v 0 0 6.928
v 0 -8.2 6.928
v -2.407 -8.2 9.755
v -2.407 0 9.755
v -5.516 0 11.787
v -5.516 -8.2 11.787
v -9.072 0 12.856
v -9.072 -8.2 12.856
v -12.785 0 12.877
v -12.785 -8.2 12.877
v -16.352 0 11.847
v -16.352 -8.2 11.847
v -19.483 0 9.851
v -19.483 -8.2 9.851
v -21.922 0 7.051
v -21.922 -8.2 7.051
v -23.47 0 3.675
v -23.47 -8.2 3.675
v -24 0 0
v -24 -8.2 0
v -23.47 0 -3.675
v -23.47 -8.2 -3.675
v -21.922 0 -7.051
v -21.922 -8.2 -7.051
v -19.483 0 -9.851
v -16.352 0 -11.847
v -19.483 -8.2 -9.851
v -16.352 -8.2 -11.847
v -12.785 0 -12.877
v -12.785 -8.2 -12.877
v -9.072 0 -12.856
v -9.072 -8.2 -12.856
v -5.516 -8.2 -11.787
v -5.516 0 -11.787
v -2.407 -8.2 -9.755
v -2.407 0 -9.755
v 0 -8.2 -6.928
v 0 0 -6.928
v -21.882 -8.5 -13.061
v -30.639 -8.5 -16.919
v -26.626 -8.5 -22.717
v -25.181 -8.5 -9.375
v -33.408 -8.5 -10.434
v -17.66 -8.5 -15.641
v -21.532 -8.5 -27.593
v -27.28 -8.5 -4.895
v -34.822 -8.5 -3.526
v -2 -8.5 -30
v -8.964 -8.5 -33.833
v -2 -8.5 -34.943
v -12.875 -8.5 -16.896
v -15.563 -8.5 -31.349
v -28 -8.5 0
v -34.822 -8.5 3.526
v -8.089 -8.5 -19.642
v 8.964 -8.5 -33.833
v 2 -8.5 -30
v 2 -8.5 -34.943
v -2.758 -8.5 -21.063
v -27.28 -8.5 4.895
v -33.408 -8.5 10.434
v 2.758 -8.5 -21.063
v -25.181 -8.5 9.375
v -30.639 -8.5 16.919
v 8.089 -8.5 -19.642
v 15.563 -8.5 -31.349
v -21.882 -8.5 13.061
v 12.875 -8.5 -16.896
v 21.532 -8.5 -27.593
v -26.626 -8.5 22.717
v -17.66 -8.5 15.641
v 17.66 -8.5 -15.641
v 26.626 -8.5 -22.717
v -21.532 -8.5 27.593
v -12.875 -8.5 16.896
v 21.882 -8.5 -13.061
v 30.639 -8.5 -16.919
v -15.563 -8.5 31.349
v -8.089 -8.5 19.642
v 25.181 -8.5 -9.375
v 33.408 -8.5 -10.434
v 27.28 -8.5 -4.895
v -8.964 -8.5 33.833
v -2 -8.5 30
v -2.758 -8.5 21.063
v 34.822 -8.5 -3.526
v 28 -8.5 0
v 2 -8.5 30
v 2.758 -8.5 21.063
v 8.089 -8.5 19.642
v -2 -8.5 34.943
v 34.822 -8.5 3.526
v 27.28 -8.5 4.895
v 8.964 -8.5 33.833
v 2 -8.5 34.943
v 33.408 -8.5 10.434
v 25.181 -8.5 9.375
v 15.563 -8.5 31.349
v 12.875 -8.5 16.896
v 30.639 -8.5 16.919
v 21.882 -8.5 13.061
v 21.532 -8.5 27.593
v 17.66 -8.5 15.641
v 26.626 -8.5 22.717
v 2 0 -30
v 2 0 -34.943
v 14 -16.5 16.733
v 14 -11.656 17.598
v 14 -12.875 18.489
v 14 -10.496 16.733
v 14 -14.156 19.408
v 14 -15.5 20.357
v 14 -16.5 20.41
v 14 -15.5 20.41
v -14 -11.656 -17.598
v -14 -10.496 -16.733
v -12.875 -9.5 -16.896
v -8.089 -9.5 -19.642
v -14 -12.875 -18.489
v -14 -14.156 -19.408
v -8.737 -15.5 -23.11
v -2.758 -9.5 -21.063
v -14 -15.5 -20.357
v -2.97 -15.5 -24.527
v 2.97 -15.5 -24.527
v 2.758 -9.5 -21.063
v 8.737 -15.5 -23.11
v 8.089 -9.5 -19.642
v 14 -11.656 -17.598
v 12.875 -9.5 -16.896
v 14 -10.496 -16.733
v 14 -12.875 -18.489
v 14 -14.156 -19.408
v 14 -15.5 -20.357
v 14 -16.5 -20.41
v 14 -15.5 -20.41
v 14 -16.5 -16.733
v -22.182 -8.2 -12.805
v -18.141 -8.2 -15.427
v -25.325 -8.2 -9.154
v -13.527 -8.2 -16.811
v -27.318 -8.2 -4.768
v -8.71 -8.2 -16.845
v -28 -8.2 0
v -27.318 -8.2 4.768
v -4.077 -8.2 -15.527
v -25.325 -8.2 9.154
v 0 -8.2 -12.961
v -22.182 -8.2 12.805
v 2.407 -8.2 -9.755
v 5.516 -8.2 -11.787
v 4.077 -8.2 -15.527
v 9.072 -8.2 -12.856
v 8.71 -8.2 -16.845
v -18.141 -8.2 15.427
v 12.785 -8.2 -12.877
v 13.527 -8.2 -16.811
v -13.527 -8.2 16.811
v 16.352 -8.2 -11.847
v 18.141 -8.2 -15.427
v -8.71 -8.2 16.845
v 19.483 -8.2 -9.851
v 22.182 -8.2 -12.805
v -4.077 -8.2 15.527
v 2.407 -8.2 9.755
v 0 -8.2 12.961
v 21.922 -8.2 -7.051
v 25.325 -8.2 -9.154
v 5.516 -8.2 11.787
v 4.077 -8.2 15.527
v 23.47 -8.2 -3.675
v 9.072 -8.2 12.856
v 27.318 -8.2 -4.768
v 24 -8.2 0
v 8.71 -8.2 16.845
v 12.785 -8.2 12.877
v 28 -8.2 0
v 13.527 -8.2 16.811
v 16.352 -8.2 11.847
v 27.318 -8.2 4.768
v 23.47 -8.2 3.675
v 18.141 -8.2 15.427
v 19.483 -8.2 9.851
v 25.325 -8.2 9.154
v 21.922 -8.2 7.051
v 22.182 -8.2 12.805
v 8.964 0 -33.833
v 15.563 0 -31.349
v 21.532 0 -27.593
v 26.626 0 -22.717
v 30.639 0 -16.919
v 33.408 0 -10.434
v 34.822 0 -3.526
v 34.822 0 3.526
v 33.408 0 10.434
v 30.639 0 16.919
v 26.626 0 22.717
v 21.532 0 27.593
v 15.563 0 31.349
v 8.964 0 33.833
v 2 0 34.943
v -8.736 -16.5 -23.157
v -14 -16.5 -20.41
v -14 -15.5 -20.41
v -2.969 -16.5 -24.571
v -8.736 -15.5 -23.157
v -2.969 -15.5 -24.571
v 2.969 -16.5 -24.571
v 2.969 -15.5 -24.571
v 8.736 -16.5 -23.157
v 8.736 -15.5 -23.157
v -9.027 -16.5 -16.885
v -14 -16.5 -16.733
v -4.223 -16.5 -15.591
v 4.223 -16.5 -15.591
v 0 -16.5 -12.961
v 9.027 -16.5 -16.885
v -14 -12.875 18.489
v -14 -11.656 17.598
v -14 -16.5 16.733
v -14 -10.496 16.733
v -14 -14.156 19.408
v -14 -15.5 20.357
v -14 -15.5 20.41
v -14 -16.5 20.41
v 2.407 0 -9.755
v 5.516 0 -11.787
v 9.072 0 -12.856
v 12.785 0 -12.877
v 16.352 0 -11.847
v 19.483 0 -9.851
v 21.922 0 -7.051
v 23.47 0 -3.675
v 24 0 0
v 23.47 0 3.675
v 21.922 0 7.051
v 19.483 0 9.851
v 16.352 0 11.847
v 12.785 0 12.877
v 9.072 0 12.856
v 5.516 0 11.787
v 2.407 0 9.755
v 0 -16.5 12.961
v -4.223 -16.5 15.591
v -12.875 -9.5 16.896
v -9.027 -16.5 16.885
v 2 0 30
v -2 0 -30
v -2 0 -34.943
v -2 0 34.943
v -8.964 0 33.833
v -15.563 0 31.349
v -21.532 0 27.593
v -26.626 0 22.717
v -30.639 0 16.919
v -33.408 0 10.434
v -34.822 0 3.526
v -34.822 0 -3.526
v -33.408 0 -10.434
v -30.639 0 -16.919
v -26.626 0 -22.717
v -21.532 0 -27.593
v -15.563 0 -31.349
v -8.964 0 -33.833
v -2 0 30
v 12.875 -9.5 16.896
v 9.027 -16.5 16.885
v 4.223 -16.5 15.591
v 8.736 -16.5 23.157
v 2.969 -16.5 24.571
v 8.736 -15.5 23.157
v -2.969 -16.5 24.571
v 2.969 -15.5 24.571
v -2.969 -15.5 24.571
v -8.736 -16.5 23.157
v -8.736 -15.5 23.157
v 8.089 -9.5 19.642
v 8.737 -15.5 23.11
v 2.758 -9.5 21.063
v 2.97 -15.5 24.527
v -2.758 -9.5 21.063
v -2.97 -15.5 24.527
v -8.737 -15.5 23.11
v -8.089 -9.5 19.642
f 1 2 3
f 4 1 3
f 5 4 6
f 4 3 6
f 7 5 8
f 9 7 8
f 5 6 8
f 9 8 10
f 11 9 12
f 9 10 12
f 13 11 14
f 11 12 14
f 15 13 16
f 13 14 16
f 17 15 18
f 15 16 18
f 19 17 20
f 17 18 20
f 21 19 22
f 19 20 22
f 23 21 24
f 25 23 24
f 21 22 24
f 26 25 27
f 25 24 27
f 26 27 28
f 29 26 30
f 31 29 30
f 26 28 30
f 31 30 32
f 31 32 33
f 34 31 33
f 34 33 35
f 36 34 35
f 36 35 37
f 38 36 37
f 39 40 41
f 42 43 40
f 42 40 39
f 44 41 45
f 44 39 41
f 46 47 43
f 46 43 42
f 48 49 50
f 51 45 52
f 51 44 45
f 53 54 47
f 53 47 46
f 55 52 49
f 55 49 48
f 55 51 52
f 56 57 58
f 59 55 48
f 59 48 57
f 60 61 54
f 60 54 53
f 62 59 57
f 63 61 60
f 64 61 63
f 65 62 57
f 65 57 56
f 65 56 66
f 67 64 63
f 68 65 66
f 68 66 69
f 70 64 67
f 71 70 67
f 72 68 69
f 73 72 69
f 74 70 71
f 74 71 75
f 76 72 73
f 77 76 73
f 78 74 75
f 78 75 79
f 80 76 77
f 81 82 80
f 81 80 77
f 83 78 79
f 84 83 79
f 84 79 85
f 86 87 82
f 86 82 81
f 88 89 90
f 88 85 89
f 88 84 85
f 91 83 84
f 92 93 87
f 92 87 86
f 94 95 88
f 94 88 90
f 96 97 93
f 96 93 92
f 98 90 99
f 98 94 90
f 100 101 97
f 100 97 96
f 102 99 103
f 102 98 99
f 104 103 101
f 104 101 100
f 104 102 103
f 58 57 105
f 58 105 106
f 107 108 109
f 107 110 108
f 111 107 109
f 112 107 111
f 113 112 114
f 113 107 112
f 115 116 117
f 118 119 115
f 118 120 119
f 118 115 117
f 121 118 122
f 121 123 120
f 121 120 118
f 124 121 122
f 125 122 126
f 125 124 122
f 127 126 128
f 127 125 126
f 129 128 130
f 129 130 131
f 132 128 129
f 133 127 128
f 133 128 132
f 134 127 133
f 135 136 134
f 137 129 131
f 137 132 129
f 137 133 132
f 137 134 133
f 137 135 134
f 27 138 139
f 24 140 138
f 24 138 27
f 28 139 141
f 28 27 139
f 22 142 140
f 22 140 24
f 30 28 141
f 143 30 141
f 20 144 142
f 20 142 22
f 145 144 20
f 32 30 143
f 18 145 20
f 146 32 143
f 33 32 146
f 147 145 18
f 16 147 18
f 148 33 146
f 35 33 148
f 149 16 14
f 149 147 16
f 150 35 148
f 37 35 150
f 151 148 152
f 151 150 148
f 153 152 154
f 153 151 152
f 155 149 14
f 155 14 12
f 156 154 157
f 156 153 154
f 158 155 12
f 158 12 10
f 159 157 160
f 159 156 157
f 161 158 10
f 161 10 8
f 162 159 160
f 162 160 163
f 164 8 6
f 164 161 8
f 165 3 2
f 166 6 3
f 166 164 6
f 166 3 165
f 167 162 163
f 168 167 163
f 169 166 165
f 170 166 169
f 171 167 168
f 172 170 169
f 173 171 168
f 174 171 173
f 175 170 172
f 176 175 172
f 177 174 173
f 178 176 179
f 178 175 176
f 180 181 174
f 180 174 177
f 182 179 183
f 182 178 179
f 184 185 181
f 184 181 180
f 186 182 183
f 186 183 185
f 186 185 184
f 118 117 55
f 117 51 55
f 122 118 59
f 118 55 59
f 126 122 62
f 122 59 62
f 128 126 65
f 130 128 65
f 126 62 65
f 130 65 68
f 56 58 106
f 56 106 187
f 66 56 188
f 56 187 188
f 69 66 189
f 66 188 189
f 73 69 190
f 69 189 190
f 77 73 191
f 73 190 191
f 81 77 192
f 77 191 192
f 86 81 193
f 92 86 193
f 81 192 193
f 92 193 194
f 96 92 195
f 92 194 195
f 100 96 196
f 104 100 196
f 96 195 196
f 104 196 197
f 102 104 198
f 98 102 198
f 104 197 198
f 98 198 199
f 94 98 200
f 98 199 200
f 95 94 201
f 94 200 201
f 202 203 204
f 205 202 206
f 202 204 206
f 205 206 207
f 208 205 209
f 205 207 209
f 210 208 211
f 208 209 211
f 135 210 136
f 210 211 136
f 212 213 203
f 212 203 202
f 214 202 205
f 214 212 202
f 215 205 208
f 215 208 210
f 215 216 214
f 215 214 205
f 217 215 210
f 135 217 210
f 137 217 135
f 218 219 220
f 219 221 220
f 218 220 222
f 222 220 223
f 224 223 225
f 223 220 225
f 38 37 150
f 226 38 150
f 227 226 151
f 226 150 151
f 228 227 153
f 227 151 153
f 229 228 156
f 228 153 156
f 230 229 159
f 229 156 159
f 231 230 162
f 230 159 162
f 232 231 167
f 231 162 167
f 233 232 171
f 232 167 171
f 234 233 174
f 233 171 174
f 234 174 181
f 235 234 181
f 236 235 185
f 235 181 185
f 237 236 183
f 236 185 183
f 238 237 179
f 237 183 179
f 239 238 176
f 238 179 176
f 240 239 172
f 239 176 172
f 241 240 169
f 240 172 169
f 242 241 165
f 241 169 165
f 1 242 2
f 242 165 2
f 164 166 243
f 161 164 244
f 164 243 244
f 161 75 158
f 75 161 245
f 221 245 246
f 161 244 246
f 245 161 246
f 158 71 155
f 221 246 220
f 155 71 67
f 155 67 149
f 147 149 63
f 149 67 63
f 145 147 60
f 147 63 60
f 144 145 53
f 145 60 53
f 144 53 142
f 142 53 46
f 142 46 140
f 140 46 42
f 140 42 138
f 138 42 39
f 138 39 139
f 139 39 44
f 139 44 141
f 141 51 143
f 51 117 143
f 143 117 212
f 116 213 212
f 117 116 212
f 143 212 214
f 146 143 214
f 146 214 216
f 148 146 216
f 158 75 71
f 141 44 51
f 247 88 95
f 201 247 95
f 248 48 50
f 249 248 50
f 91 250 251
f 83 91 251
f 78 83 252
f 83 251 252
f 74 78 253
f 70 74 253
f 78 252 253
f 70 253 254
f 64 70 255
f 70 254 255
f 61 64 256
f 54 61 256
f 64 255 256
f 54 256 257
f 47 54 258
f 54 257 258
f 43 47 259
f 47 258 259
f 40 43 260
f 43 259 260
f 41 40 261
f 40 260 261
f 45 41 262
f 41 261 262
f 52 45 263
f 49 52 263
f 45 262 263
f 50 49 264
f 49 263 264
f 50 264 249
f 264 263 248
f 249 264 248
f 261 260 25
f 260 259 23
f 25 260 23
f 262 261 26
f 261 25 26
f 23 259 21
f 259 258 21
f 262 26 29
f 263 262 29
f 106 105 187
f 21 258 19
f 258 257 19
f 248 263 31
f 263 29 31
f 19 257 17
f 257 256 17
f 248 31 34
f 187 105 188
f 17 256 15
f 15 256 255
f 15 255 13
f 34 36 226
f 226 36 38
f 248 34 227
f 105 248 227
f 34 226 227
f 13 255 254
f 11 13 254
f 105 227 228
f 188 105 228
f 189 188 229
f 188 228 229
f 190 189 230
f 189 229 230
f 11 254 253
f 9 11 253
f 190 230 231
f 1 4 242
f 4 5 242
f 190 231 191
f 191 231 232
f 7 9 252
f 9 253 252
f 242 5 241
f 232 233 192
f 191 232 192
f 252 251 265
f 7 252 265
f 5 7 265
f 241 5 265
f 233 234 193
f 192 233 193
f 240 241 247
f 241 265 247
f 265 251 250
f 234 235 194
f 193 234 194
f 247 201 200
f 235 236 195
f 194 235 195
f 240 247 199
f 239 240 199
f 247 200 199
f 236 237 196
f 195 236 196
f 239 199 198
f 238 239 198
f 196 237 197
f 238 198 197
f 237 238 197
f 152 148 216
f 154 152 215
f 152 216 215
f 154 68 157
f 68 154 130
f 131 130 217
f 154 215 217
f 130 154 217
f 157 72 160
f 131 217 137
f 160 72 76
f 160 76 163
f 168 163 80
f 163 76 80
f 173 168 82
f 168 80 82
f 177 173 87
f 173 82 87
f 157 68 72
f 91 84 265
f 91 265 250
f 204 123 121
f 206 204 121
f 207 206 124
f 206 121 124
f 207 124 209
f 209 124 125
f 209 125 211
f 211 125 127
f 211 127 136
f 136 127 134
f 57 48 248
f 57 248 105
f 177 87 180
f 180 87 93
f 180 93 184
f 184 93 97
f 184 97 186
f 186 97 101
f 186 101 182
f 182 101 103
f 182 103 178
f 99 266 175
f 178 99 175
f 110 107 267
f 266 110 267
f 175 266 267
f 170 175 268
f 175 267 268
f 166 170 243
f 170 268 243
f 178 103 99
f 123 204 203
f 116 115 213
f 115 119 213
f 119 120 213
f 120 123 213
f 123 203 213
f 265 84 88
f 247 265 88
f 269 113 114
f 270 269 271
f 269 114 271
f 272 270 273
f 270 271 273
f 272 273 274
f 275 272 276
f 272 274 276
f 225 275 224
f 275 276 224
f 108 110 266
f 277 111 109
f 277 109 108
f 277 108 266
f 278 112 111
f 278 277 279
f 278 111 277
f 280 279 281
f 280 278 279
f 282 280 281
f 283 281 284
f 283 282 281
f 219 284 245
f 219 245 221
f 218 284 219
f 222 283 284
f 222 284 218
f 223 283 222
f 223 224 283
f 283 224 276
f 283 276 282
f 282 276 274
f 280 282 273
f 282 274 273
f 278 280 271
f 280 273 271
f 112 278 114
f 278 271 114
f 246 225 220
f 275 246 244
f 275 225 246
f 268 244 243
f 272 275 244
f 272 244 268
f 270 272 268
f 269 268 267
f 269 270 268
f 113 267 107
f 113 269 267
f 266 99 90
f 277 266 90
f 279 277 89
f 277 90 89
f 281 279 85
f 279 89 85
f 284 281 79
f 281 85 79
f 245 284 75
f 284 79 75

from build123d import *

# Parameters (mm, degrees)
F0_R      = 35
F1_DEPTH  = 8.5
F2_R      = 21.2425
F3_DEPTH  = 1
F4_R      = 21.2425
F5_DEPTH  = 6
F5_TAPER  = -30
F6_R      = 24.75
F7_DEPTH  = 1
F9_DEPTH  = 16.5
F11_DEPTH = 8.3
F12_W     = 12.0533492022
F12_H     = 52.1821774244
F12_W_2   = 10.4364354849
F12_H_2   = 52.770149804
F13_DEPTH = 8
F14_W     = 4
F14_H     = 6
F15_DEPTH = 8.5


# Not quite as in the source:
# - a pattern or mirror of a feature is missing from the dataset's text; its kind, count and spacing are read off the source's solid


with BuildPart() as f1:
    # F0 (on Front) → F1 (new body)
    with BuildSketch(Plane.XZ):
        Circle(F0_R)
    extrude(amount=F1_DEPTH)

    # F2 (on face) → F3 (join)
    with BuildSketch(Plane.XZ.offset(8.5)):
        Circle(F2_R)
    extrude(amount=F3_DEPTH)

    # F4 (on face) → F5 (join)
    with BuildSketch(Plane.XZ.offset(9.5)):
        Circle(F4_R)
    extrude(amount=F5_DEPTH, taper=F5_TAPER)

    # F6 (on face) → F7 (join)
    with BuildSketch(Plane.XZ.offset(15.5)):
        Circle(F6_R)
    extrude(amount=F7_DEPTH)

    # F8 (on face) → F9 (cut)
    with BuildSketch(Plane.XZ.offset(16.5)):
        with BuildLine():
            ThreePointArc((0, -6.9282032303), (1.4899959968, -3.6055512755), (2, 0))
            ThreePointArc((2, 0), (1.4899959968, 3.6055512755), (0, 6.9282032303))
            ThreePointArc((0, 6.9282032303), (-2, 0), (0, -6.9282032303))
        make_face()
        with BuildLine():
            ThreePointArc((0, 6.9282032303), (1.4899959968, 3.6055512755), (2, 0))
            ThreePointArc((2, 0), (1.4899959968, -3.6055512755), (0, -6.9282032303))
            ThreePointArc((0, -6.9282032303), (14.6055512755, -12.4899959968), (24, 0))
            ThreePointArc((24, 0), (14.6055512755, 12.4899959968), (0, 6.9282032303))
        make_face()
        with BuildLine():
            ThreePointArc((0, -6.9282032303), (-2, 0), (0, 6.9282032303))
            ThreePointArc((0, 6.9282032303), (-24, 0), (0, -6.9282032303))
        make_face()
    extrude(amount=-F9_DEPTH, mode=Mode.SUBTRACT)

    # F10 (on face) → F11 (cut)
    with BuildSketch(Plane.XZ.offset(16.5)):
        with BuildLine():
            ThreePointArc((0, -12.9614813968), (4.4272486205, -7.1414284285), (6, 0))
            ThreePointArc((6, 0), (4.4272486205, 7.1414284285), (0, 12.9614813968))
            ThreePointArc((0, 12.9614813968), (-6, 0), (0, -12.9614813968))
        make_face()
        with BuildLine():
            ThreePointArc((0, 12.9614813968), (4.4272486205, 7.1414284285), (6, 0))
            ThreePointArc((6, 0), (4.4272486205, -7.1414284285), (0, -12.9614813968))
            ThreePointArc((0, -12.9614813968), (18.1414284285, -15.4272486205), (28, 0))
            ThreePointArc((28, 0), (18.1414284285, 15.4272486205), (0, 12.9614813968))
        make_face()
        with BuildLine():
            ThreePointArc((0, -12.9614813968), (-6, 0), (0, 12.9614813968))
            ThreePointArc((0, 12.9614813968), (-28, 0), (0, -12.9614813968))
        make_face()
    extrude(amount=-F11_DEPTH, mode=Mode.SUBTRACT)

    # F12 (on face) → F13 (cut)
    with BuildSketch(Plane.XZ.offset(16.5)):
        with Locations((20.0266746011, 0.6560230852)):
            Rectangle(F12_W, F12_H)
        with Locations((-19.2182177424, 2.2729368025)):
            Rectangle(F12_W_2, F12_H_2)
    extrude(amount=-F13_DEPTH, mode=Mode.SUBTRACT)

    # F14 (on face) → F15 (cut)
    with BuildSketch(Plane.XZ.offset(8.5)):
        with Locations((0, 33)):
            Rectangle(F14_W, F14_H)
    f15 = extrude(amount=-F15_DEPTH, mode=Mode.SUBTRACT)

    # F15_copies: F15 across plane
    add(f15.mirror(Plane(origin=(0, 0, 0), x_dir=(-1, 0, 0), z_dir=(0, 0, -1))), mode=Mode.SUBTRACT)


solid = f1.part
